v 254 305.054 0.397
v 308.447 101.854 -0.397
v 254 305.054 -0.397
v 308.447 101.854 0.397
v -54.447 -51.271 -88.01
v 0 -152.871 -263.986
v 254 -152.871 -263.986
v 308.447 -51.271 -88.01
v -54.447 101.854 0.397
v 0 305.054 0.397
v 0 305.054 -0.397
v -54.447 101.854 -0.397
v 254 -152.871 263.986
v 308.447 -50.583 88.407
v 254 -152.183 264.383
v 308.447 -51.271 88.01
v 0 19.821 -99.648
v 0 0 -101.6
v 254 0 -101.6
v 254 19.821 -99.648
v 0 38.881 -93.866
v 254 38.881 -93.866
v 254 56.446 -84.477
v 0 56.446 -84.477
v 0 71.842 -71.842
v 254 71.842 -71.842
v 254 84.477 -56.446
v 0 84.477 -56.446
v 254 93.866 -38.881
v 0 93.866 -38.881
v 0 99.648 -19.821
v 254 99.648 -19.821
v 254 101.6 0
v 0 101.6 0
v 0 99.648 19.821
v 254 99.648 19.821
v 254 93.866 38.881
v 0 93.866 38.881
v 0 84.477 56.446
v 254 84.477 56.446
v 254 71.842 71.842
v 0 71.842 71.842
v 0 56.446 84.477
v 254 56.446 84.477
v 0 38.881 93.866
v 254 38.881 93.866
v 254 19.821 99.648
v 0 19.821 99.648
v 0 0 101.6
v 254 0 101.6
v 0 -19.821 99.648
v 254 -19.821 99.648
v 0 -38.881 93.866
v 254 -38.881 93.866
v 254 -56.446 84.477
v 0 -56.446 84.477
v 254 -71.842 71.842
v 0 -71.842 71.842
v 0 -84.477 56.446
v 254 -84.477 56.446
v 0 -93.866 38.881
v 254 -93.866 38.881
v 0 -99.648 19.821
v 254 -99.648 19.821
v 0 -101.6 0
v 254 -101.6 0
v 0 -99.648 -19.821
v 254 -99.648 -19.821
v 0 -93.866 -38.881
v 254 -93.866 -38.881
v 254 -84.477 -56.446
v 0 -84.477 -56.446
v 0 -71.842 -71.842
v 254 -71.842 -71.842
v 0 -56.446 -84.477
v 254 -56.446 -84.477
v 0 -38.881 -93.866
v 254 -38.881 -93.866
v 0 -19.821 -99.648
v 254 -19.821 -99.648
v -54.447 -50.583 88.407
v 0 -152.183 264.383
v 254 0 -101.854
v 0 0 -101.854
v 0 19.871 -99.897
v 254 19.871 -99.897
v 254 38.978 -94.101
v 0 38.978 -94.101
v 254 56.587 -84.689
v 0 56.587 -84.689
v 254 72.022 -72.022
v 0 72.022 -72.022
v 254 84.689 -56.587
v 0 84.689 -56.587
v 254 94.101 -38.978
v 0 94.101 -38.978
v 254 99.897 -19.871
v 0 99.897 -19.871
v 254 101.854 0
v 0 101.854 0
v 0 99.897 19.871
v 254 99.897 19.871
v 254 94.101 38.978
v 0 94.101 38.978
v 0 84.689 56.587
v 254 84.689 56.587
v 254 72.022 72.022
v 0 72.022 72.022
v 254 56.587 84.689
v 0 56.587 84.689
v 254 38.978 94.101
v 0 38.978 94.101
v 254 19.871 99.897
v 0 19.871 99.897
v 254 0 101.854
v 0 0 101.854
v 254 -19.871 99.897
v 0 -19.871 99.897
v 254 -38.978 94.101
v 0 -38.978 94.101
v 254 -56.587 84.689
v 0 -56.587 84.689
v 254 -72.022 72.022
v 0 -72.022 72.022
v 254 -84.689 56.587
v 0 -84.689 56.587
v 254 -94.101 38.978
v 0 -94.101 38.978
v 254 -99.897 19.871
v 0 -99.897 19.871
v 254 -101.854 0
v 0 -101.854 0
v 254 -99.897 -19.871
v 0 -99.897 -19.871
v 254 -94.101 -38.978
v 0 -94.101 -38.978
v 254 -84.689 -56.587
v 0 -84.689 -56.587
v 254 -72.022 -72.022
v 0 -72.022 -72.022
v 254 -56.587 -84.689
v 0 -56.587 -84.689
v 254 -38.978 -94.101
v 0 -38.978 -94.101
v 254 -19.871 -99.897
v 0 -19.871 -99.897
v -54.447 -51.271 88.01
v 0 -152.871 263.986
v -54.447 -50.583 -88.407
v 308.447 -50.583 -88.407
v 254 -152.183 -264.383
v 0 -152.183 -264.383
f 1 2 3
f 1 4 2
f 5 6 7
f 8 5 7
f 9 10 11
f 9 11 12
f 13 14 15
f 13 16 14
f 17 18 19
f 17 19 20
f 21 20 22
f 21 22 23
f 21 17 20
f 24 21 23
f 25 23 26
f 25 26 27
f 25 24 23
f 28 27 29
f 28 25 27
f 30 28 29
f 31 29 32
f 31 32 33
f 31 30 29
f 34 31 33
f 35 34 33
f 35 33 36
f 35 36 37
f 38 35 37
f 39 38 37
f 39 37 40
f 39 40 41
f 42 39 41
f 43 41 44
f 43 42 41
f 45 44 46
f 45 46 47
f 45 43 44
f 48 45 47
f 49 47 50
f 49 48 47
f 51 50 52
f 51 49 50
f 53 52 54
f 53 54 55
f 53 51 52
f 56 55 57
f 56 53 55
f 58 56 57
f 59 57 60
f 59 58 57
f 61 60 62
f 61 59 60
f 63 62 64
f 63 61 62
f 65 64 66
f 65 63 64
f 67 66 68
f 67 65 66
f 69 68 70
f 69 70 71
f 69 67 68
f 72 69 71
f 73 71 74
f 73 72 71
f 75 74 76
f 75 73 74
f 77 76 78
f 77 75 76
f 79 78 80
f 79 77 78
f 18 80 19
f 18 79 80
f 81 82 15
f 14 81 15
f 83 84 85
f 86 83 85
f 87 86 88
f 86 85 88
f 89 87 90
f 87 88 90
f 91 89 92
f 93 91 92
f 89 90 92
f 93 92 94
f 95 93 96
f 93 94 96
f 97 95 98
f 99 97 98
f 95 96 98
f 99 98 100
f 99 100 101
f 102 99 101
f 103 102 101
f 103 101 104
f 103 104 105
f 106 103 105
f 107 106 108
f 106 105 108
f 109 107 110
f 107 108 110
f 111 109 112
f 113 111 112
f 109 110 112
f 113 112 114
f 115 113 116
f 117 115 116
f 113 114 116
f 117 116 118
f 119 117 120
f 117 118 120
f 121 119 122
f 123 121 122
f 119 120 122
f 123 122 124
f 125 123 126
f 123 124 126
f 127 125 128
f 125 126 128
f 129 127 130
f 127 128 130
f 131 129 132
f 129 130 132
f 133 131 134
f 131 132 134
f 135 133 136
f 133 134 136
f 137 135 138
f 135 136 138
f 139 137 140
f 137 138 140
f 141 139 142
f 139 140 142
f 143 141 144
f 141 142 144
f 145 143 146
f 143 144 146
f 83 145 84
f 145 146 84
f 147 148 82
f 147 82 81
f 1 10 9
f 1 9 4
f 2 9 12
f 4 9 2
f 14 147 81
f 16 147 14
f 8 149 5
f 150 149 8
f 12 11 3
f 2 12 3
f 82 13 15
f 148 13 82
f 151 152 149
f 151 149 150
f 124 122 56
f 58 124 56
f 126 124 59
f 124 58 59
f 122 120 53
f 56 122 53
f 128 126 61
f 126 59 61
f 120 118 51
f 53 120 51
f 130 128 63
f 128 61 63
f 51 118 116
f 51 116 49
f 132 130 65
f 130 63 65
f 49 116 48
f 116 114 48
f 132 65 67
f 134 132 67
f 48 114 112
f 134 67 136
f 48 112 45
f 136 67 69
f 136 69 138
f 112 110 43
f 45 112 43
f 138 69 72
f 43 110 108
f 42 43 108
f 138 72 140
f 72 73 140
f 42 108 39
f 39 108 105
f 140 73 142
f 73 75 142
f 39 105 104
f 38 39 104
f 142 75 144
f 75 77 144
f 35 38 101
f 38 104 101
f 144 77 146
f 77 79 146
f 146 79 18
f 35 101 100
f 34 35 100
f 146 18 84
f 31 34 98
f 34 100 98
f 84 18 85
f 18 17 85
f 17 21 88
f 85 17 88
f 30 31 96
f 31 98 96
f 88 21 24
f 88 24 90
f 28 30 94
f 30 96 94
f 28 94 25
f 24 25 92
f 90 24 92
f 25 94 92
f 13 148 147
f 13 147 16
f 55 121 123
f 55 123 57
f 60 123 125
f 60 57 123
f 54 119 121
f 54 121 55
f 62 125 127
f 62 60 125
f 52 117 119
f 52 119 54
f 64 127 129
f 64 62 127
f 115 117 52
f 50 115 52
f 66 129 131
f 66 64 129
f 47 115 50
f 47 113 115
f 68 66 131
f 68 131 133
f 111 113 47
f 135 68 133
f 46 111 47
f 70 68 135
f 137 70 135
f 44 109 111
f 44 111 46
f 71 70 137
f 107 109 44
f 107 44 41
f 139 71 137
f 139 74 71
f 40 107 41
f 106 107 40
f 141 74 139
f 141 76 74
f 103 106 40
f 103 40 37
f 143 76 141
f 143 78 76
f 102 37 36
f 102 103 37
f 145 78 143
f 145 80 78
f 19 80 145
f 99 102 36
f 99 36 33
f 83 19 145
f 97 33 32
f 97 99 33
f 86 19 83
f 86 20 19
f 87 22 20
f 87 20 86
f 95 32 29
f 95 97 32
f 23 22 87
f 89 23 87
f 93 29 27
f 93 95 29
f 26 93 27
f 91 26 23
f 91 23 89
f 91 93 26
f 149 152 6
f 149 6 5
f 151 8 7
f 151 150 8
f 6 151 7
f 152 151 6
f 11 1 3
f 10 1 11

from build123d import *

# Parameters (mm, degrees)
SKETCH1_R           = 101.854
SKETCH1_R_2         = 101.6
EXTRUDE_THIN1_DEPTH = 254
BOSS_EXTRUDE1_DEPTH = 0.396875
CIRPATTERN2_COUNT   = 3


with BuildPart() as part:
    # Sketch1 → Extrude-Thin1 (new body)
    with BuildSketch(Plane(origin=(0, 0, 0), x_dir=(0, 0, -1), z_dir=(1, 0, 0))):
        Circle(SKETCH1_R)
        Circle(SKETCH1_R_2, mode=Mode.SUBTRACT)
    extrude(amount=EXTRUDE_THIN1_DEPTH)


with BuildPart() as body_2:
    # Sketch2 → Boss-Extrude1 (new, symmetric)
    with BuildSketch(Plane.XY):
        Polygon((308.447275902, 101.854), (254, 305.054), (0, 305.054), (-54.447275902, 101.854), align=None)
    extrude(amount=BOSS_EXTRUDE1_DEPTH, both=True)


with BuildPart() as cirpattern2_1:
    # CirPattern2: pattern copy
    add(body_2.part.rotate(Axis((-33.196859496, 0, 0), (1, 0, 0)), 1 * 360 / CIRPATTERN2_COUNT))


with BuildPart() as cirpattern2_2:
    # CirPattern2: pattern copy
    add(body_2.part.rotate(Axis((-33.196859496, 0, 0), (1, 0, 0)), 2 * 360 / CIRPATTERN2_COUNT))


solid = Compound([part.part, body_2.part, cirpattern2_1.part, cirpattern2_2.part])
